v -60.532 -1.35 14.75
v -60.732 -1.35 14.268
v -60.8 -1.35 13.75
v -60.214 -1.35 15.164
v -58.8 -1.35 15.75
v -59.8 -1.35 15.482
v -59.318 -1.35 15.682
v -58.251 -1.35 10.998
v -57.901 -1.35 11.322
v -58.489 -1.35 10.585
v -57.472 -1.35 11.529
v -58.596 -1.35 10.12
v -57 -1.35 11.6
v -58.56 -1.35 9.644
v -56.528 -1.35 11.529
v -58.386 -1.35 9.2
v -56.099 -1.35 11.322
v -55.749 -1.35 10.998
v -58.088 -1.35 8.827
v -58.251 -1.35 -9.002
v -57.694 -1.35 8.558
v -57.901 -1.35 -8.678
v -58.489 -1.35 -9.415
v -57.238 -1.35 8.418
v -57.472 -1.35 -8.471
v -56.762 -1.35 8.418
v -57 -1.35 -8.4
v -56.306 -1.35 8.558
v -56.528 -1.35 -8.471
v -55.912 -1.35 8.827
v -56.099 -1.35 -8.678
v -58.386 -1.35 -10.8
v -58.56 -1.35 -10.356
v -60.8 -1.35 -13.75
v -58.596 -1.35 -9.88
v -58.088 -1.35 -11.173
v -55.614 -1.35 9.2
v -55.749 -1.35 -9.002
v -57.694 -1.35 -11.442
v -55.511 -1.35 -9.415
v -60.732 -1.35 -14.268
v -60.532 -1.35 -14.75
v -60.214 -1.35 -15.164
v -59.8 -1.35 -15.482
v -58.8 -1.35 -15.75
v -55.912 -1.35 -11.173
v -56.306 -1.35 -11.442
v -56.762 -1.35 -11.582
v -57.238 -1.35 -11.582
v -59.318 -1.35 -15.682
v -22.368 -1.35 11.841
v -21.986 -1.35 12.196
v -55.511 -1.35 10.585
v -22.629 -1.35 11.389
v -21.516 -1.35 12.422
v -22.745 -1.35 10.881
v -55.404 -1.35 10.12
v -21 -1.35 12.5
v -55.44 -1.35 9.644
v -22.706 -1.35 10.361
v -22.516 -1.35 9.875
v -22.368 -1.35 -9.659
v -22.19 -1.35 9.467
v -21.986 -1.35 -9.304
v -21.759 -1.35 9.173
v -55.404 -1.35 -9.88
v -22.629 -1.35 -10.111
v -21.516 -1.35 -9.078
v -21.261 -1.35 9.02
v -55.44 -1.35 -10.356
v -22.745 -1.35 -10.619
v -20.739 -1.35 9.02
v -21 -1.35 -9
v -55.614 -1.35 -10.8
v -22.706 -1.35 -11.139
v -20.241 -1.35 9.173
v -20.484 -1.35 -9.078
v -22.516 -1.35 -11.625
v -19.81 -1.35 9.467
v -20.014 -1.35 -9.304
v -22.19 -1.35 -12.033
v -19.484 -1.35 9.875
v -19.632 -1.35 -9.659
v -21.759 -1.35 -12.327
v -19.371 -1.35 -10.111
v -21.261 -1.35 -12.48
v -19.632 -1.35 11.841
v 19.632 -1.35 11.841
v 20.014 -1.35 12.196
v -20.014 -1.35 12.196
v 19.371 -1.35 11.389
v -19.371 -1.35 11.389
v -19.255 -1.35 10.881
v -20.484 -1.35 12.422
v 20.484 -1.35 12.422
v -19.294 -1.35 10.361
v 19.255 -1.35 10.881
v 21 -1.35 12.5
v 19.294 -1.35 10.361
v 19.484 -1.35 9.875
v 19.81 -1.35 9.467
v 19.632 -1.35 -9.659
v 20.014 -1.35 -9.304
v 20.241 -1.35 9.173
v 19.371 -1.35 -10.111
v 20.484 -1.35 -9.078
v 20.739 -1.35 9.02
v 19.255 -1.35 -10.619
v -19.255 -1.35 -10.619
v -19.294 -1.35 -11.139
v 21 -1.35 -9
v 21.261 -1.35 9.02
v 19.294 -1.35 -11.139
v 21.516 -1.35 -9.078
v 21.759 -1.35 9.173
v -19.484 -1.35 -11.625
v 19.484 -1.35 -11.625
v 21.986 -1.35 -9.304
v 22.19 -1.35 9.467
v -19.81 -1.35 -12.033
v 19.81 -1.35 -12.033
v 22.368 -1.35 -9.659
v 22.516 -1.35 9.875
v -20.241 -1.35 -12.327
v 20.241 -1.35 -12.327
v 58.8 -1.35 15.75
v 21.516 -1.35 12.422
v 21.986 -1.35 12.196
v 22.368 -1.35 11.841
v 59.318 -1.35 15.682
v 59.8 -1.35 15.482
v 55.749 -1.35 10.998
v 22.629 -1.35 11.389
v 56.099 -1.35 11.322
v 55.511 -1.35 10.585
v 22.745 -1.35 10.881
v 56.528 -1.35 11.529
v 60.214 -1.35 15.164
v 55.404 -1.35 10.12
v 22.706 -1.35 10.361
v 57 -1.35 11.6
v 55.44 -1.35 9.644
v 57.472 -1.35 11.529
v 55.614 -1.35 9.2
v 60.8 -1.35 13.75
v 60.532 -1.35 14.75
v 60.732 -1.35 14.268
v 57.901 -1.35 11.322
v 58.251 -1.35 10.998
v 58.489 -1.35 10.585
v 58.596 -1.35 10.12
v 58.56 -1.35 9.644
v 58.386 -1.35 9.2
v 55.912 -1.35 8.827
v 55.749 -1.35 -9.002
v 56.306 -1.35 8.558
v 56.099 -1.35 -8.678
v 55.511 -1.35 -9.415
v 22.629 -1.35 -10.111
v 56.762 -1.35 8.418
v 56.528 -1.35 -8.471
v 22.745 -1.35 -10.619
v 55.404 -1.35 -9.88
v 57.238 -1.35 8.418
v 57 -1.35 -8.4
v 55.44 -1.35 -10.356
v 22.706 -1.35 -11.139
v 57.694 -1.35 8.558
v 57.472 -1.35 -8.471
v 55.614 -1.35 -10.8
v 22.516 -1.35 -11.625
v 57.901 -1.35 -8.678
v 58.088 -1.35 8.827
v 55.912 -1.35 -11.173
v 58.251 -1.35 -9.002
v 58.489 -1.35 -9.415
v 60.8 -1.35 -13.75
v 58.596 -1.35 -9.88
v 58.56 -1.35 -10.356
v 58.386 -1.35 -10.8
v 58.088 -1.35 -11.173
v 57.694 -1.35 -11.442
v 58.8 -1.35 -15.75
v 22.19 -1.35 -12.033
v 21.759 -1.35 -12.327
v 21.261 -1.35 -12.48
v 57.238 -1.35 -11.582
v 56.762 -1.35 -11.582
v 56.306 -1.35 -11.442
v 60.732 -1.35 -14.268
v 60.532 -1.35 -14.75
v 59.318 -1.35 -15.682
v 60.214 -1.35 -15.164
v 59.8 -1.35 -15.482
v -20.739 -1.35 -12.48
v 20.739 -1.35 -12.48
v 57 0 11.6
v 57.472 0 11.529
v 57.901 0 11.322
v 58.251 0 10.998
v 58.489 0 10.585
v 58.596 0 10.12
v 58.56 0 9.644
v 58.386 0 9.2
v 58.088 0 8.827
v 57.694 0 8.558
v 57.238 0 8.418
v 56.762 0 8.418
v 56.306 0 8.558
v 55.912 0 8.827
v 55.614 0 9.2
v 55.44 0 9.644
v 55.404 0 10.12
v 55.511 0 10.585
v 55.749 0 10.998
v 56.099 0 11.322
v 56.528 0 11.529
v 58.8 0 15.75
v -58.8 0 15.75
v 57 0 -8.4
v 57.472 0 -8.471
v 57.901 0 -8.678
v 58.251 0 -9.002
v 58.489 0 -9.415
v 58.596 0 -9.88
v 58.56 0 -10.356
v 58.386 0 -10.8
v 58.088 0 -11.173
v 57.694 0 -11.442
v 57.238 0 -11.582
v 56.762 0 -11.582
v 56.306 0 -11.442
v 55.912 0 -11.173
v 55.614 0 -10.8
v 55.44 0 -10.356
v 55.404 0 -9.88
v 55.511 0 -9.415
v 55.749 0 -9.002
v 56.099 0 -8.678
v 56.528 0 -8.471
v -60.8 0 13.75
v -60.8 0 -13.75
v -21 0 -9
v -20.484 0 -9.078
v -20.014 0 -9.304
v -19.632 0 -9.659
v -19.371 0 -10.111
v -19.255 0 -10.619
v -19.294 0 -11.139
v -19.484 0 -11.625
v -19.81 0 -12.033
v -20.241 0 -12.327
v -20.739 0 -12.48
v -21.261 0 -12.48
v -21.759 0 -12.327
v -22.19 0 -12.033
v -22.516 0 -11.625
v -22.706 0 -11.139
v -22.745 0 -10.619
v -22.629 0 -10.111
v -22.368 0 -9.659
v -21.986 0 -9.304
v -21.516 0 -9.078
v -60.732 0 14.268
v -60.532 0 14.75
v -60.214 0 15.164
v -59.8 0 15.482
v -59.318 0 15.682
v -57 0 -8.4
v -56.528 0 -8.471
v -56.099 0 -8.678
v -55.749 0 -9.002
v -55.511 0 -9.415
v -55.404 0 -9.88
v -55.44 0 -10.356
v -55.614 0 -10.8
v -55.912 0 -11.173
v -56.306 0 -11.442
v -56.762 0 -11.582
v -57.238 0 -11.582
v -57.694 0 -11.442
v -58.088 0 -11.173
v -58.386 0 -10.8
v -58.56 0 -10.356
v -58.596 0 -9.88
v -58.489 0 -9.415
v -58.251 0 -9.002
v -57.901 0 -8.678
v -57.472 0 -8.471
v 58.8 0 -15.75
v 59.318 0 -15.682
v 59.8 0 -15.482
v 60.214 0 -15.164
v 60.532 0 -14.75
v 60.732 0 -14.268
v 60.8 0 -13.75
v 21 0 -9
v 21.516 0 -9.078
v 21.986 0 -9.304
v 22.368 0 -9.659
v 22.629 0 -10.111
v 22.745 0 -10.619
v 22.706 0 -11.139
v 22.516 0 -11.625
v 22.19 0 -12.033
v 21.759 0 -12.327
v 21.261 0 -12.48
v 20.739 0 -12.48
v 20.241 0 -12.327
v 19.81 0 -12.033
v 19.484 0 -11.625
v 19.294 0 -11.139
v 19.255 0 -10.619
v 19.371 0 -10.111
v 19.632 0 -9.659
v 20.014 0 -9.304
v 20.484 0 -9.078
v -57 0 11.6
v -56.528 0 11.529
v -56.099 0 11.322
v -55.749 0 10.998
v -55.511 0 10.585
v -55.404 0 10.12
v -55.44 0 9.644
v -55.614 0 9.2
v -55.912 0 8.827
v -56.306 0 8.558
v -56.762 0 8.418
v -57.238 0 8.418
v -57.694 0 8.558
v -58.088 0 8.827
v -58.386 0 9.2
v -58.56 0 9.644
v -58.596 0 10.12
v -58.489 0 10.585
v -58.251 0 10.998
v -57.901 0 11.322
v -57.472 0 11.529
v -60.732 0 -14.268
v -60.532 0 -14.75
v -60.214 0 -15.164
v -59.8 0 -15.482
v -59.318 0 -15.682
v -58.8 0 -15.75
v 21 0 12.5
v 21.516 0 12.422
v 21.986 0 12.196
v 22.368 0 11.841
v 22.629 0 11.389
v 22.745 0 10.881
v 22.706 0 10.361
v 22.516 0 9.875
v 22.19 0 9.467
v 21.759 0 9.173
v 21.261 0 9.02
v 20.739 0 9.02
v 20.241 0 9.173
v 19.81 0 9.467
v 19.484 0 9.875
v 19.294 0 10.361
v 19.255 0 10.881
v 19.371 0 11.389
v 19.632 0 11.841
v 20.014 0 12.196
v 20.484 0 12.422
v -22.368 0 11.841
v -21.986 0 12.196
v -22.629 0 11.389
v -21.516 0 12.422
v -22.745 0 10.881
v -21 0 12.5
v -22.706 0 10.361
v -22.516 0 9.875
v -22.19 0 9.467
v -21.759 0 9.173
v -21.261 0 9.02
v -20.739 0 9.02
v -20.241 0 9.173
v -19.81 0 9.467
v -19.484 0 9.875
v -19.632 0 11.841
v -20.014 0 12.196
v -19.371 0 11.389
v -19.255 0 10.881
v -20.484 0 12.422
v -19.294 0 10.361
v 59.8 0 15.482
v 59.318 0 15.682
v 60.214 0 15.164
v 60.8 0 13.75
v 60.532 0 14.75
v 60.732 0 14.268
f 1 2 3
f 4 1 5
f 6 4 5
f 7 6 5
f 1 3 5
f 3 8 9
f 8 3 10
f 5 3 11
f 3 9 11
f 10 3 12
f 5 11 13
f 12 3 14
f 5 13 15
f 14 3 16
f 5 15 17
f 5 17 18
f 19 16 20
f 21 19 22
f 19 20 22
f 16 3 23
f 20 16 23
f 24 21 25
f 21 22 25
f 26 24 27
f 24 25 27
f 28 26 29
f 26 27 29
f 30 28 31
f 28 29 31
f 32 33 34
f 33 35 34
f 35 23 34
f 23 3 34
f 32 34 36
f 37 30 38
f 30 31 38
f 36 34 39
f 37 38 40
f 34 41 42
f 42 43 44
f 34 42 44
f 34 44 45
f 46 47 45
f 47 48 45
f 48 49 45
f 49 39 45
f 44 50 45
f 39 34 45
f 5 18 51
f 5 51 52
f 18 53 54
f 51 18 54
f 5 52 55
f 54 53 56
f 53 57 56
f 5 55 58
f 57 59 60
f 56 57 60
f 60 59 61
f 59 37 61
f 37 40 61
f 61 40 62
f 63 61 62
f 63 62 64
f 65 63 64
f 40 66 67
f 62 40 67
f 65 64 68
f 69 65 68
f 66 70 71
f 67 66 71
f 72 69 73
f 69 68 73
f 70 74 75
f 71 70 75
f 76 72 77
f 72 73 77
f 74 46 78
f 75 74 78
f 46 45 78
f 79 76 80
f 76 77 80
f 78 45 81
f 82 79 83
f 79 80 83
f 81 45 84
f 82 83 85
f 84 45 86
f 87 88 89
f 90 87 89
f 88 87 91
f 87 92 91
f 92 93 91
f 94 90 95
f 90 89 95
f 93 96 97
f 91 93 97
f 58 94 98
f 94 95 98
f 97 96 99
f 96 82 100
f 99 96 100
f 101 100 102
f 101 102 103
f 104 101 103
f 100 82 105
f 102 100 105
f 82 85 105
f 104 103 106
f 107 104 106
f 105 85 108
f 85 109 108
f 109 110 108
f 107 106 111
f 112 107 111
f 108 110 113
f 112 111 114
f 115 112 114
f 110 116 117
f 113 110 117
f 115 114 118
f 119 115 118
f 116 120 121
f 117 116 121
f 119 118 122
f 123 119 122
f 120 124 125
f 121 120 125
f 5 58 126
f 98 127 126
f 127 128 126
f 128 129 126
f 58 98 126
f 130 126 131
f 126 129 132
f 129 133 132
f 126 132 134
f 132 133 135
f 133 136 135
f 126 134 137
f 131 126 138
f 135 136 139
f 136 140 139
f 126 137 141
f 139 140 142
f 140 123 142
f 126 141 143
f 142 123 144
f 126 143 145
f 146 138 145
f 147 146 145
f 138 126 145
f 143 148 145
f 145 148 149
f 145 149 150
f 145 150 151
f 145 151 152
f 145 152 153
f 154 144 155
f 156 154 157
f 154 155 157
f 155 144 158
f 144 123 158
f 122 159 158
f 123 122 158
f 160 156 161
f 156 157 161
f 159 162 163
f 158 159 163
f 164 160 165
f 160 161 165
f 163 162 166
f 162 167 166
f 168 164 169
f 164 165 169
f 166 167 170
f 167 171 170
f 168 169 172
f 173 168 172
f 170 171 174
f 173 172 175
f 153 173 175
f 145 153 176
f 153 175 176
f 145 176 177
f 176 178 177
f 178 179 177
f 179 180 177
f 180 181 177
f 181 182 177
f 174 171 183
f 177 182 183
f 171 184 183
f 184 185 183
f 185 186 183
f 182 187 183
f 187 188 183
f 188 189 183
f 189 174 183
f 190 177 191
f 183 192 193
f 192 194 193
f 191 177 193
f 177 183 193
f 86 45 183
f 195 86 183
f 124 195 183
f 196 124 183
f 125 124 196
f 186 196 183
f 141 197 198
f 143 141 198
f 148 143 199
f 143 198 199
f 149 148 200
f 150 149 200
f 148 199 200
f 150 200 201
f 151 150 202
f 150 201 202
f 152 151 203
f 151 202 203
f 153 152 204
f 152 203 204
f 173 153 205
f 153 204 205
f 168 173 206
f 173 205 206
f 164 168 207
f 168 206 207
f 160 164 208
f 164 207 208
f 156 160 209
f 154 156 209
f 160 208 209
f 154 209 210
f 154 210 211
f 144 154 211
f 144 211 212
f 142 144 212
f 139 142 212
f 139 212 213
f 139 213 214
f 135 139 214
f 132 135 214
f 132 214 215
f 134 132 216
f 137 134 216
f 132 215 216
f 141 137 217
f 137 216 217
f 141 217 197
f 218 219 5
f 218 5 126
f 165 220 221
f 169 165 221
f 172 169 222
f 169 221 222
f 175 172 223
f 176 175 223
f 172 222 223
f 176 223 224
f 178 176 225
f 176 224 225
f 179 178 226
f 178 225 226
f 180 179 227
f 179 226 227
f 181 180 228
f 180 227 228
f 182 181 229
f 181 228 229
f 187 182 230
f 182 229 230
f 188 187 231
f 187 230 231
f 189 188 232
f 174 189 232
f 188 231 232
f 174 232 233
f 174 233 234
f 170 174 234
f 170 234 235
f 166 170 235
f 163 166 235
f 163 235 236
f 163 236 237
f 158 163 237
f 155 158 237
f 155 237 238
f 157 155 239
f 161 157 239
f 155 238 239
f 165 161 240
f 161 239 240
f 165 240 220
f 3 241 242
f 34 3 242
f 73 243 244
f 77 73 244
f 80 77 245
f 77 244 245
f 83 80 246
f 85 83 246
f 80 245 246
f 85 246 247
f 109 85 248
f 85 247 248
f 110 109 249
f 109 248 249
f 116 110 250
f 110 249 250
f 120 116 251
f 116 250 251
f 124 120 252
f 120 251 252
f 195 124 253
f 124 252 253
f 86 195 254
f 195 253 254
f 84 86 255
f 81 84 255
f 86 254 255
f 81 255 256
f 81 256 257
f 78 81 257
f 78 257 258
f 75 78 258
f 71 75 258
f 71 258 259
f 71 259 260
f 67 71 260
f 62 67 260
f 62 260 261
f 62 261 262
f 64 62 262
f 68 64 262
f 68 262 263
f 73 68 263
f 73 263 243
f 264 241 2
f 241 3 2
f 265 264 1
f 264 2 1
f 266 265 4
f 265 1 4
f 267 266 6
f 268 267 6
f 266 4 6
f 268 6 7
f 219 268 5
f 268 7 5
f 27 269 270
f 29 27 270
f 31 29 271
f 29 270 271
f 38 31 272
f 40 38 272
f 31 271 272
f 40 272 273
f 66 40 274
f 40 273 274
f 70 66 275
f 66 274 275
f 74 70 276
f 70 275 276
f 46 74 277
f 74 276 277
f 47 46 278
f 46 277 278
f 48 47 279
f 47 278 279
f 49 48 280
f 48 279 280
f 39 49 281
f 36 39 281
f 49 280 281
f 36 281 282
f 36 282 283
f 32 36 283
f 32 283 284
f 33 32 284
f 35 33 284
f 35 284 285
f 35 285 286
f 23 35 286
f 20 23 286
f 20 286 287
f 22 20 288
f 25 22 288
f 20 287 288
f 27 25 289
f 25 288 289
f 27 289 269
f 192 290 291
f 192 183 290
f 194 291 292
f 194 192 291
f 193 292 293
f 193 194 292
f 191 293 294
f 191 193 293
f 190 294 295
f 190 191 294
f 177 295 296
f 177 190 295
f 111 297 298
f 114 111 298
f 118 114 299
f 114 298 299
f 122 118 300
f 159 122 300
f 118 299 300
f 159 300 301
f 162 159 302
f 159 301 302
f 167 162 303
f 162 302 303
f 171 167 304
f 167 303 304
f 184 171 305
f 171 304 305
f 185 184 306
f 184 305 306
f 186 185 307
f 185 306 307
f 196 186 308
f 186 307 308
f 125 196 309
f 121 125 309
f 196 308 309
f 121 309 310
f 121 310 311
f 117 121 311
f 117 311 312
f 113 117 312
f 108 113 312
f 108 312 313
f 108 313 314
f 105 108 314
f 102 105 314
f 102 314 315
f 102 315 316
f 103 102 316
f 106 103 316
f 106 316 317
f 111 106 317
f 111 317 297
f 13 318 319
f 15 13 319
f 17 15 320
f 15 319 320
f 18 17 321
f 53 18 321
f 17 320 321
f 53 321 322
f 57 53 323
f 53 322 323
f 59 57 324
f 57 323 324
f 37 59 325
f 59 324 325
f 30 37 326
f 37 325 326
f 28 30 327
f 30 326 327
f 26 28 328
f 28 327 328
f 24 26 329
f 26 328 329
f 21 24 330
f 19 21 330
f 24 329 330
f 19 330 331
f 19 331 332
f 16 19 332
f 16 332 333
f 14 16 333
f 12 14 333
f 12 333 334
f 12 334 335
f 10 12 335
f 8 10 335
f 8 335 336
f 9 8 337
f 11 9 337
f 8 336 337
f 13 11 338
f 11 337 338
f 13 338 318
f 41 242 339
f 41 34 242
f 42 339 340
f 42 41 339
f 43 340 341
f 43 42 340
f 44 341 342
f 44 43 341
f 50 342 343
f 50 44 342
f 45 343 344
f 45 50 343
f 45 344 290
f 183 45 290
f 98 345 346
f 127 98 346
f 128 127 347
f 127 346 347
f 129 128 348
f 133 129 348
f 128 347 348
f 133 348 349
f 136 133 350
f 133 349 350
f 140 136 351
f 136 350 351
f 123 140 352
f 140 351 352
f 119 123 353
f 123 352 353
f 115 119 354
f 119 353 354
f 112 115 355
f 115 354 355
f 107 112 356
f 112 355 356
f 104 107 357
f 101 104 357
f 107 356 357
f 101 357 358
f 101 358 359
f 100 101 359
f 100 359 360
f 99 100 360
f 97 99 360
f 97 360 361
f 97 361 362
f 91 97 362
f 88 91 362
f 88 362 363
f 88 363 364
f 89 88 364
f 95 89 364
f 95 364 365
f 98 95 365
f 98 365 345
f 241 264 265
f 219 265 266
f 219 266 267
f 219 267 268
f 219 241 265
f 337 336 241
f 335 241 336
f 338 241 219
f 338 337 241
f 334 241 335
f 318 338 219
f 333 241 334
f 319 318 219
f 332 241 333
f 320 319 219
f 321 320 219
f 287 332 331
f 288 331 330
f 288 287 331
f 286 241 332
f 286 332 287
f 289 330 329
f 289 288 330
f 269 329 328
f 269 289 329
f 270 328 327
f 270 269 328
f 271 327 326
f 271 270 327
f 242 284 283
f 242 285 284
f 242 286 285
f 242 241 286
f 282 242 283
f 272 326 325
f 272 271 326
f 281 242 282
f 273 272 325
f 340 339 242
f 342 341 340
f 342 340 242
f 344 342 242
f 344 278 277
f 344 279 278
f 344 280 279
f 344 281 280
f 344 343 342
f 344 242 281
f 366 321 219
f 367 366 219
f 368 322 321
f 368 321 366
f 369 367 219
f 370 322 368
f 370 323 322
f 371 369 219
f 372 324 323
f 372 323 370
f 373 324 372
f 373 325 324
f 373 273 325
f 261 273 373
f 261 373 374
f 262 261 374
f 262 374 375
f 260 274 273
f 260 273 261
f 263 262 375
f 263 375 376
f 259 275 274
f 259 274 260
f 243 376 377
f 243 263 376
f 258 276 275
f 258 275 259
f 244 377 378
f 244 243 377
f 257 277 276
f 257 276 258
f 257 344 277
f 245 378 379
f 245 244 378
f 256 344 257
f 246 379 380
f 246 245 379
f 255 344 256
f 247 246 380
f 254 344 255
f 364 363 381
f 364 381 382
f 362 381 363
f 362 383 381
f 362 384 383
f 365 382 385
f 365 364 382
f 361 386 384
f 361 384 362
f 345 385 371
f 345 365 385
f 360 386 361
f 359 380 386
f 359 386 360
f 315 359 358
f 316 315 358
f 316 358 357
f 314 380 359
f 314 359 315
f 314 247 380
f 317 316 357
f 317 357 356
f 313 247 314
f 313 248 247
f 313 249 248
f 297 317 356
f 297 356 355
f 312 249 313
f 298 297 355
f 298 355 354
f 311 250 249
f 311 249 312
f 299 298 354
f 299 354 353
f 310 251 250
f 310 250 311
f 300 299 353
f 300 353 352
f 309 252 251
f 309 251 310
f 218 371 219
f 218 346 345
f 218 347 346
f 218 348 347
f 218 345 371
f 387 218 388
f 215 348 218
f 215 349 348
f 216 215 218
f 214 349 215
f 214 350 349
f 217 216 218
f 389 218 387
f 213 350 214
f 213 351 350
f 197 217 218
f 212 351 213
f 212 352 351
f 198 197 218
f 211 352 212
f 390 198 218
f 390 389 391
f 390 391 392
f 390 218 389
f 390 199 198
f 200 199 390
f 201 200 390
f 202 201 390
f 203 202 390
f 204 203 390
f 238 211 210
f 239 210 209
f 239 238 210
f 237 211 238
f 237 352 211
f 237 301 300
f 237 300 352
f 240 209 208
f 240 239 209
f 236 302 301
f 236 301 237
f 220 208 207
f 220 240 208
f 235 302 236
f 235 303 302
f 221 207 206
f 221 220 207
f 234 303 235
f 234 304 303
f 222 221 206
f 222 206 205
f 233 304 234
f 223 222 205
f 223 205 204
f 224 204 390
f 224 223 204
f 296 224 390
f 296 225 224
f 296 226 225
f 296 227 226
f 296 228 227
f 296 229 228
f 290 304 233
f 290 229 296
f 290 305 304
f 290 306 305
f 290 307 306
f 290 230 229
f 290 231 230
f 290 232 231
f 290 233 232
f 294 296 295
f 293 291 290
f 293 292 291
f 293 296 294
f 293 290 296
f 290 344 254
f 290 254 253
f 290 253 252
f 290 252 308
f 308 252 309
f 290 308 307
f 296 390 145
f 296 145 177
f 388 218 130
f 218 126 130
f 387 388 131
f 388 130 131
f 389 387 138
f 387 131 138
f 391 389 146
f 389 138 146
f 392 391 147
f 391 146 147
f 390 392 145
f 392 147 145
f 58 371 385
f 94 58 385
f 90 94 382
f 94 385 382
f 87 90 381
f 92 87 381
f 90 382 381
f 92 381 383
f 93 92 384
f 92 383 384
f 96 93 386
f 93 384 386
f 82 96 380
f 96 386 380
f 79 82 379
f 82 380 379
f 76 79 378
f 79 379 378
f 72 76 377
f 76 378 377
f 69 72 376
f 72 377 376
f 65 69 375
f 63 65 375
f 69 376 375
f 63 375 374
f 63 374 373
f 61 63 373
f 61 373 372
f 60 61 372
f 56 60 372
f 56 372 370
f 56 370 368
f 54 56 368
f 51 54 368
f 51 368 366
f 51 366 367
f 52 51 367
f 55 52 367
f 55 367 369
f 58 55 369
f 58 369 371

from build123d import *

# Parameters (mm, degrees)
SKETCH2_W           = 121.6
SKETCH2_H           = 31.5
SKETCH2_R           = 1.6
BOSS_EXTRUDE1_DEPTH = 1.35
FILLET1_R           = 2
SKETCH3_R           = 1.75
CUT_EXTRUDE1_DEPTH  = 63.821373751


with BuildPart() as part:
    # Sketch2 → Boss-Extrude1 (new body)
    with BuildSketch(Plane(origin=(0, 0, 0), x_dir=(1, 0, 0), z_dir=(0, 1, 0))):
        Rectangle(SKETCH2_W, SKETCH2_H)
        with Locations(Location((-57, 10, 0), (0, 0, 270))):
            Circle(SKETCH2_R, mode=Mode.SUBTRACT)
        with Locations(Location((-57, -10, 0), (0, 0, 270))):
            Circle(SKETCH2_R, mode=Mode.SUBTRACT)
        with Locations(Location((57, 10, 0), (0, 0, 270))):
            Circle(SKETCH2_R, mode=Mode.SUBTRACT)
        with Locations(Location((57, -10, 0), (0, 0, 270))):
            Circle(SKETCH2_R, mode=Mode.SUBTRACT)
    extrude(amount=-BOSS_EXTRUDE1_DEPTH)

    # Fillet1
    fillet1_edges = [part.edges().sort_by_distance(p)[0] for p in [
        (-60.8, -0.675, -15.75),
        (60.8, -0.675, -15.75),
        (60.8, -0.675, 15.75),
        (-60.8, -0.675, 15.75),
    ]]
    fillet(fillet1_edges, radius=FILLET1_R)

    # Sketch3 → Cut-Extrude1 (cut, through all)
    with BuildSketch(Plane(origin=(0, 0, 0), x_dir=(1, 0, 0), z_dir=(0, 1, 0))):
        with Locations(Location((-21, -10.75, 0), (0, 0, 270))):
            Circle(SKETCH3_R)
        with Locations(Location((21, -10.75, 0), (0, 0, 270))):
            Circle(SKETCH3_R)
        with Locations(Location((21, 10.75, 0), (0, 0, 270))):
            Circle(SKETCH3_R)
        with Locations(Location((-21, 10.75, 0), (0, 0, 270))):
            Circle(SKETCH3_R)
    extrude(amount=-CUT_EXTRUDE1_DEPTH, mode=Mode.SUBTRACT)


solid = part.part
